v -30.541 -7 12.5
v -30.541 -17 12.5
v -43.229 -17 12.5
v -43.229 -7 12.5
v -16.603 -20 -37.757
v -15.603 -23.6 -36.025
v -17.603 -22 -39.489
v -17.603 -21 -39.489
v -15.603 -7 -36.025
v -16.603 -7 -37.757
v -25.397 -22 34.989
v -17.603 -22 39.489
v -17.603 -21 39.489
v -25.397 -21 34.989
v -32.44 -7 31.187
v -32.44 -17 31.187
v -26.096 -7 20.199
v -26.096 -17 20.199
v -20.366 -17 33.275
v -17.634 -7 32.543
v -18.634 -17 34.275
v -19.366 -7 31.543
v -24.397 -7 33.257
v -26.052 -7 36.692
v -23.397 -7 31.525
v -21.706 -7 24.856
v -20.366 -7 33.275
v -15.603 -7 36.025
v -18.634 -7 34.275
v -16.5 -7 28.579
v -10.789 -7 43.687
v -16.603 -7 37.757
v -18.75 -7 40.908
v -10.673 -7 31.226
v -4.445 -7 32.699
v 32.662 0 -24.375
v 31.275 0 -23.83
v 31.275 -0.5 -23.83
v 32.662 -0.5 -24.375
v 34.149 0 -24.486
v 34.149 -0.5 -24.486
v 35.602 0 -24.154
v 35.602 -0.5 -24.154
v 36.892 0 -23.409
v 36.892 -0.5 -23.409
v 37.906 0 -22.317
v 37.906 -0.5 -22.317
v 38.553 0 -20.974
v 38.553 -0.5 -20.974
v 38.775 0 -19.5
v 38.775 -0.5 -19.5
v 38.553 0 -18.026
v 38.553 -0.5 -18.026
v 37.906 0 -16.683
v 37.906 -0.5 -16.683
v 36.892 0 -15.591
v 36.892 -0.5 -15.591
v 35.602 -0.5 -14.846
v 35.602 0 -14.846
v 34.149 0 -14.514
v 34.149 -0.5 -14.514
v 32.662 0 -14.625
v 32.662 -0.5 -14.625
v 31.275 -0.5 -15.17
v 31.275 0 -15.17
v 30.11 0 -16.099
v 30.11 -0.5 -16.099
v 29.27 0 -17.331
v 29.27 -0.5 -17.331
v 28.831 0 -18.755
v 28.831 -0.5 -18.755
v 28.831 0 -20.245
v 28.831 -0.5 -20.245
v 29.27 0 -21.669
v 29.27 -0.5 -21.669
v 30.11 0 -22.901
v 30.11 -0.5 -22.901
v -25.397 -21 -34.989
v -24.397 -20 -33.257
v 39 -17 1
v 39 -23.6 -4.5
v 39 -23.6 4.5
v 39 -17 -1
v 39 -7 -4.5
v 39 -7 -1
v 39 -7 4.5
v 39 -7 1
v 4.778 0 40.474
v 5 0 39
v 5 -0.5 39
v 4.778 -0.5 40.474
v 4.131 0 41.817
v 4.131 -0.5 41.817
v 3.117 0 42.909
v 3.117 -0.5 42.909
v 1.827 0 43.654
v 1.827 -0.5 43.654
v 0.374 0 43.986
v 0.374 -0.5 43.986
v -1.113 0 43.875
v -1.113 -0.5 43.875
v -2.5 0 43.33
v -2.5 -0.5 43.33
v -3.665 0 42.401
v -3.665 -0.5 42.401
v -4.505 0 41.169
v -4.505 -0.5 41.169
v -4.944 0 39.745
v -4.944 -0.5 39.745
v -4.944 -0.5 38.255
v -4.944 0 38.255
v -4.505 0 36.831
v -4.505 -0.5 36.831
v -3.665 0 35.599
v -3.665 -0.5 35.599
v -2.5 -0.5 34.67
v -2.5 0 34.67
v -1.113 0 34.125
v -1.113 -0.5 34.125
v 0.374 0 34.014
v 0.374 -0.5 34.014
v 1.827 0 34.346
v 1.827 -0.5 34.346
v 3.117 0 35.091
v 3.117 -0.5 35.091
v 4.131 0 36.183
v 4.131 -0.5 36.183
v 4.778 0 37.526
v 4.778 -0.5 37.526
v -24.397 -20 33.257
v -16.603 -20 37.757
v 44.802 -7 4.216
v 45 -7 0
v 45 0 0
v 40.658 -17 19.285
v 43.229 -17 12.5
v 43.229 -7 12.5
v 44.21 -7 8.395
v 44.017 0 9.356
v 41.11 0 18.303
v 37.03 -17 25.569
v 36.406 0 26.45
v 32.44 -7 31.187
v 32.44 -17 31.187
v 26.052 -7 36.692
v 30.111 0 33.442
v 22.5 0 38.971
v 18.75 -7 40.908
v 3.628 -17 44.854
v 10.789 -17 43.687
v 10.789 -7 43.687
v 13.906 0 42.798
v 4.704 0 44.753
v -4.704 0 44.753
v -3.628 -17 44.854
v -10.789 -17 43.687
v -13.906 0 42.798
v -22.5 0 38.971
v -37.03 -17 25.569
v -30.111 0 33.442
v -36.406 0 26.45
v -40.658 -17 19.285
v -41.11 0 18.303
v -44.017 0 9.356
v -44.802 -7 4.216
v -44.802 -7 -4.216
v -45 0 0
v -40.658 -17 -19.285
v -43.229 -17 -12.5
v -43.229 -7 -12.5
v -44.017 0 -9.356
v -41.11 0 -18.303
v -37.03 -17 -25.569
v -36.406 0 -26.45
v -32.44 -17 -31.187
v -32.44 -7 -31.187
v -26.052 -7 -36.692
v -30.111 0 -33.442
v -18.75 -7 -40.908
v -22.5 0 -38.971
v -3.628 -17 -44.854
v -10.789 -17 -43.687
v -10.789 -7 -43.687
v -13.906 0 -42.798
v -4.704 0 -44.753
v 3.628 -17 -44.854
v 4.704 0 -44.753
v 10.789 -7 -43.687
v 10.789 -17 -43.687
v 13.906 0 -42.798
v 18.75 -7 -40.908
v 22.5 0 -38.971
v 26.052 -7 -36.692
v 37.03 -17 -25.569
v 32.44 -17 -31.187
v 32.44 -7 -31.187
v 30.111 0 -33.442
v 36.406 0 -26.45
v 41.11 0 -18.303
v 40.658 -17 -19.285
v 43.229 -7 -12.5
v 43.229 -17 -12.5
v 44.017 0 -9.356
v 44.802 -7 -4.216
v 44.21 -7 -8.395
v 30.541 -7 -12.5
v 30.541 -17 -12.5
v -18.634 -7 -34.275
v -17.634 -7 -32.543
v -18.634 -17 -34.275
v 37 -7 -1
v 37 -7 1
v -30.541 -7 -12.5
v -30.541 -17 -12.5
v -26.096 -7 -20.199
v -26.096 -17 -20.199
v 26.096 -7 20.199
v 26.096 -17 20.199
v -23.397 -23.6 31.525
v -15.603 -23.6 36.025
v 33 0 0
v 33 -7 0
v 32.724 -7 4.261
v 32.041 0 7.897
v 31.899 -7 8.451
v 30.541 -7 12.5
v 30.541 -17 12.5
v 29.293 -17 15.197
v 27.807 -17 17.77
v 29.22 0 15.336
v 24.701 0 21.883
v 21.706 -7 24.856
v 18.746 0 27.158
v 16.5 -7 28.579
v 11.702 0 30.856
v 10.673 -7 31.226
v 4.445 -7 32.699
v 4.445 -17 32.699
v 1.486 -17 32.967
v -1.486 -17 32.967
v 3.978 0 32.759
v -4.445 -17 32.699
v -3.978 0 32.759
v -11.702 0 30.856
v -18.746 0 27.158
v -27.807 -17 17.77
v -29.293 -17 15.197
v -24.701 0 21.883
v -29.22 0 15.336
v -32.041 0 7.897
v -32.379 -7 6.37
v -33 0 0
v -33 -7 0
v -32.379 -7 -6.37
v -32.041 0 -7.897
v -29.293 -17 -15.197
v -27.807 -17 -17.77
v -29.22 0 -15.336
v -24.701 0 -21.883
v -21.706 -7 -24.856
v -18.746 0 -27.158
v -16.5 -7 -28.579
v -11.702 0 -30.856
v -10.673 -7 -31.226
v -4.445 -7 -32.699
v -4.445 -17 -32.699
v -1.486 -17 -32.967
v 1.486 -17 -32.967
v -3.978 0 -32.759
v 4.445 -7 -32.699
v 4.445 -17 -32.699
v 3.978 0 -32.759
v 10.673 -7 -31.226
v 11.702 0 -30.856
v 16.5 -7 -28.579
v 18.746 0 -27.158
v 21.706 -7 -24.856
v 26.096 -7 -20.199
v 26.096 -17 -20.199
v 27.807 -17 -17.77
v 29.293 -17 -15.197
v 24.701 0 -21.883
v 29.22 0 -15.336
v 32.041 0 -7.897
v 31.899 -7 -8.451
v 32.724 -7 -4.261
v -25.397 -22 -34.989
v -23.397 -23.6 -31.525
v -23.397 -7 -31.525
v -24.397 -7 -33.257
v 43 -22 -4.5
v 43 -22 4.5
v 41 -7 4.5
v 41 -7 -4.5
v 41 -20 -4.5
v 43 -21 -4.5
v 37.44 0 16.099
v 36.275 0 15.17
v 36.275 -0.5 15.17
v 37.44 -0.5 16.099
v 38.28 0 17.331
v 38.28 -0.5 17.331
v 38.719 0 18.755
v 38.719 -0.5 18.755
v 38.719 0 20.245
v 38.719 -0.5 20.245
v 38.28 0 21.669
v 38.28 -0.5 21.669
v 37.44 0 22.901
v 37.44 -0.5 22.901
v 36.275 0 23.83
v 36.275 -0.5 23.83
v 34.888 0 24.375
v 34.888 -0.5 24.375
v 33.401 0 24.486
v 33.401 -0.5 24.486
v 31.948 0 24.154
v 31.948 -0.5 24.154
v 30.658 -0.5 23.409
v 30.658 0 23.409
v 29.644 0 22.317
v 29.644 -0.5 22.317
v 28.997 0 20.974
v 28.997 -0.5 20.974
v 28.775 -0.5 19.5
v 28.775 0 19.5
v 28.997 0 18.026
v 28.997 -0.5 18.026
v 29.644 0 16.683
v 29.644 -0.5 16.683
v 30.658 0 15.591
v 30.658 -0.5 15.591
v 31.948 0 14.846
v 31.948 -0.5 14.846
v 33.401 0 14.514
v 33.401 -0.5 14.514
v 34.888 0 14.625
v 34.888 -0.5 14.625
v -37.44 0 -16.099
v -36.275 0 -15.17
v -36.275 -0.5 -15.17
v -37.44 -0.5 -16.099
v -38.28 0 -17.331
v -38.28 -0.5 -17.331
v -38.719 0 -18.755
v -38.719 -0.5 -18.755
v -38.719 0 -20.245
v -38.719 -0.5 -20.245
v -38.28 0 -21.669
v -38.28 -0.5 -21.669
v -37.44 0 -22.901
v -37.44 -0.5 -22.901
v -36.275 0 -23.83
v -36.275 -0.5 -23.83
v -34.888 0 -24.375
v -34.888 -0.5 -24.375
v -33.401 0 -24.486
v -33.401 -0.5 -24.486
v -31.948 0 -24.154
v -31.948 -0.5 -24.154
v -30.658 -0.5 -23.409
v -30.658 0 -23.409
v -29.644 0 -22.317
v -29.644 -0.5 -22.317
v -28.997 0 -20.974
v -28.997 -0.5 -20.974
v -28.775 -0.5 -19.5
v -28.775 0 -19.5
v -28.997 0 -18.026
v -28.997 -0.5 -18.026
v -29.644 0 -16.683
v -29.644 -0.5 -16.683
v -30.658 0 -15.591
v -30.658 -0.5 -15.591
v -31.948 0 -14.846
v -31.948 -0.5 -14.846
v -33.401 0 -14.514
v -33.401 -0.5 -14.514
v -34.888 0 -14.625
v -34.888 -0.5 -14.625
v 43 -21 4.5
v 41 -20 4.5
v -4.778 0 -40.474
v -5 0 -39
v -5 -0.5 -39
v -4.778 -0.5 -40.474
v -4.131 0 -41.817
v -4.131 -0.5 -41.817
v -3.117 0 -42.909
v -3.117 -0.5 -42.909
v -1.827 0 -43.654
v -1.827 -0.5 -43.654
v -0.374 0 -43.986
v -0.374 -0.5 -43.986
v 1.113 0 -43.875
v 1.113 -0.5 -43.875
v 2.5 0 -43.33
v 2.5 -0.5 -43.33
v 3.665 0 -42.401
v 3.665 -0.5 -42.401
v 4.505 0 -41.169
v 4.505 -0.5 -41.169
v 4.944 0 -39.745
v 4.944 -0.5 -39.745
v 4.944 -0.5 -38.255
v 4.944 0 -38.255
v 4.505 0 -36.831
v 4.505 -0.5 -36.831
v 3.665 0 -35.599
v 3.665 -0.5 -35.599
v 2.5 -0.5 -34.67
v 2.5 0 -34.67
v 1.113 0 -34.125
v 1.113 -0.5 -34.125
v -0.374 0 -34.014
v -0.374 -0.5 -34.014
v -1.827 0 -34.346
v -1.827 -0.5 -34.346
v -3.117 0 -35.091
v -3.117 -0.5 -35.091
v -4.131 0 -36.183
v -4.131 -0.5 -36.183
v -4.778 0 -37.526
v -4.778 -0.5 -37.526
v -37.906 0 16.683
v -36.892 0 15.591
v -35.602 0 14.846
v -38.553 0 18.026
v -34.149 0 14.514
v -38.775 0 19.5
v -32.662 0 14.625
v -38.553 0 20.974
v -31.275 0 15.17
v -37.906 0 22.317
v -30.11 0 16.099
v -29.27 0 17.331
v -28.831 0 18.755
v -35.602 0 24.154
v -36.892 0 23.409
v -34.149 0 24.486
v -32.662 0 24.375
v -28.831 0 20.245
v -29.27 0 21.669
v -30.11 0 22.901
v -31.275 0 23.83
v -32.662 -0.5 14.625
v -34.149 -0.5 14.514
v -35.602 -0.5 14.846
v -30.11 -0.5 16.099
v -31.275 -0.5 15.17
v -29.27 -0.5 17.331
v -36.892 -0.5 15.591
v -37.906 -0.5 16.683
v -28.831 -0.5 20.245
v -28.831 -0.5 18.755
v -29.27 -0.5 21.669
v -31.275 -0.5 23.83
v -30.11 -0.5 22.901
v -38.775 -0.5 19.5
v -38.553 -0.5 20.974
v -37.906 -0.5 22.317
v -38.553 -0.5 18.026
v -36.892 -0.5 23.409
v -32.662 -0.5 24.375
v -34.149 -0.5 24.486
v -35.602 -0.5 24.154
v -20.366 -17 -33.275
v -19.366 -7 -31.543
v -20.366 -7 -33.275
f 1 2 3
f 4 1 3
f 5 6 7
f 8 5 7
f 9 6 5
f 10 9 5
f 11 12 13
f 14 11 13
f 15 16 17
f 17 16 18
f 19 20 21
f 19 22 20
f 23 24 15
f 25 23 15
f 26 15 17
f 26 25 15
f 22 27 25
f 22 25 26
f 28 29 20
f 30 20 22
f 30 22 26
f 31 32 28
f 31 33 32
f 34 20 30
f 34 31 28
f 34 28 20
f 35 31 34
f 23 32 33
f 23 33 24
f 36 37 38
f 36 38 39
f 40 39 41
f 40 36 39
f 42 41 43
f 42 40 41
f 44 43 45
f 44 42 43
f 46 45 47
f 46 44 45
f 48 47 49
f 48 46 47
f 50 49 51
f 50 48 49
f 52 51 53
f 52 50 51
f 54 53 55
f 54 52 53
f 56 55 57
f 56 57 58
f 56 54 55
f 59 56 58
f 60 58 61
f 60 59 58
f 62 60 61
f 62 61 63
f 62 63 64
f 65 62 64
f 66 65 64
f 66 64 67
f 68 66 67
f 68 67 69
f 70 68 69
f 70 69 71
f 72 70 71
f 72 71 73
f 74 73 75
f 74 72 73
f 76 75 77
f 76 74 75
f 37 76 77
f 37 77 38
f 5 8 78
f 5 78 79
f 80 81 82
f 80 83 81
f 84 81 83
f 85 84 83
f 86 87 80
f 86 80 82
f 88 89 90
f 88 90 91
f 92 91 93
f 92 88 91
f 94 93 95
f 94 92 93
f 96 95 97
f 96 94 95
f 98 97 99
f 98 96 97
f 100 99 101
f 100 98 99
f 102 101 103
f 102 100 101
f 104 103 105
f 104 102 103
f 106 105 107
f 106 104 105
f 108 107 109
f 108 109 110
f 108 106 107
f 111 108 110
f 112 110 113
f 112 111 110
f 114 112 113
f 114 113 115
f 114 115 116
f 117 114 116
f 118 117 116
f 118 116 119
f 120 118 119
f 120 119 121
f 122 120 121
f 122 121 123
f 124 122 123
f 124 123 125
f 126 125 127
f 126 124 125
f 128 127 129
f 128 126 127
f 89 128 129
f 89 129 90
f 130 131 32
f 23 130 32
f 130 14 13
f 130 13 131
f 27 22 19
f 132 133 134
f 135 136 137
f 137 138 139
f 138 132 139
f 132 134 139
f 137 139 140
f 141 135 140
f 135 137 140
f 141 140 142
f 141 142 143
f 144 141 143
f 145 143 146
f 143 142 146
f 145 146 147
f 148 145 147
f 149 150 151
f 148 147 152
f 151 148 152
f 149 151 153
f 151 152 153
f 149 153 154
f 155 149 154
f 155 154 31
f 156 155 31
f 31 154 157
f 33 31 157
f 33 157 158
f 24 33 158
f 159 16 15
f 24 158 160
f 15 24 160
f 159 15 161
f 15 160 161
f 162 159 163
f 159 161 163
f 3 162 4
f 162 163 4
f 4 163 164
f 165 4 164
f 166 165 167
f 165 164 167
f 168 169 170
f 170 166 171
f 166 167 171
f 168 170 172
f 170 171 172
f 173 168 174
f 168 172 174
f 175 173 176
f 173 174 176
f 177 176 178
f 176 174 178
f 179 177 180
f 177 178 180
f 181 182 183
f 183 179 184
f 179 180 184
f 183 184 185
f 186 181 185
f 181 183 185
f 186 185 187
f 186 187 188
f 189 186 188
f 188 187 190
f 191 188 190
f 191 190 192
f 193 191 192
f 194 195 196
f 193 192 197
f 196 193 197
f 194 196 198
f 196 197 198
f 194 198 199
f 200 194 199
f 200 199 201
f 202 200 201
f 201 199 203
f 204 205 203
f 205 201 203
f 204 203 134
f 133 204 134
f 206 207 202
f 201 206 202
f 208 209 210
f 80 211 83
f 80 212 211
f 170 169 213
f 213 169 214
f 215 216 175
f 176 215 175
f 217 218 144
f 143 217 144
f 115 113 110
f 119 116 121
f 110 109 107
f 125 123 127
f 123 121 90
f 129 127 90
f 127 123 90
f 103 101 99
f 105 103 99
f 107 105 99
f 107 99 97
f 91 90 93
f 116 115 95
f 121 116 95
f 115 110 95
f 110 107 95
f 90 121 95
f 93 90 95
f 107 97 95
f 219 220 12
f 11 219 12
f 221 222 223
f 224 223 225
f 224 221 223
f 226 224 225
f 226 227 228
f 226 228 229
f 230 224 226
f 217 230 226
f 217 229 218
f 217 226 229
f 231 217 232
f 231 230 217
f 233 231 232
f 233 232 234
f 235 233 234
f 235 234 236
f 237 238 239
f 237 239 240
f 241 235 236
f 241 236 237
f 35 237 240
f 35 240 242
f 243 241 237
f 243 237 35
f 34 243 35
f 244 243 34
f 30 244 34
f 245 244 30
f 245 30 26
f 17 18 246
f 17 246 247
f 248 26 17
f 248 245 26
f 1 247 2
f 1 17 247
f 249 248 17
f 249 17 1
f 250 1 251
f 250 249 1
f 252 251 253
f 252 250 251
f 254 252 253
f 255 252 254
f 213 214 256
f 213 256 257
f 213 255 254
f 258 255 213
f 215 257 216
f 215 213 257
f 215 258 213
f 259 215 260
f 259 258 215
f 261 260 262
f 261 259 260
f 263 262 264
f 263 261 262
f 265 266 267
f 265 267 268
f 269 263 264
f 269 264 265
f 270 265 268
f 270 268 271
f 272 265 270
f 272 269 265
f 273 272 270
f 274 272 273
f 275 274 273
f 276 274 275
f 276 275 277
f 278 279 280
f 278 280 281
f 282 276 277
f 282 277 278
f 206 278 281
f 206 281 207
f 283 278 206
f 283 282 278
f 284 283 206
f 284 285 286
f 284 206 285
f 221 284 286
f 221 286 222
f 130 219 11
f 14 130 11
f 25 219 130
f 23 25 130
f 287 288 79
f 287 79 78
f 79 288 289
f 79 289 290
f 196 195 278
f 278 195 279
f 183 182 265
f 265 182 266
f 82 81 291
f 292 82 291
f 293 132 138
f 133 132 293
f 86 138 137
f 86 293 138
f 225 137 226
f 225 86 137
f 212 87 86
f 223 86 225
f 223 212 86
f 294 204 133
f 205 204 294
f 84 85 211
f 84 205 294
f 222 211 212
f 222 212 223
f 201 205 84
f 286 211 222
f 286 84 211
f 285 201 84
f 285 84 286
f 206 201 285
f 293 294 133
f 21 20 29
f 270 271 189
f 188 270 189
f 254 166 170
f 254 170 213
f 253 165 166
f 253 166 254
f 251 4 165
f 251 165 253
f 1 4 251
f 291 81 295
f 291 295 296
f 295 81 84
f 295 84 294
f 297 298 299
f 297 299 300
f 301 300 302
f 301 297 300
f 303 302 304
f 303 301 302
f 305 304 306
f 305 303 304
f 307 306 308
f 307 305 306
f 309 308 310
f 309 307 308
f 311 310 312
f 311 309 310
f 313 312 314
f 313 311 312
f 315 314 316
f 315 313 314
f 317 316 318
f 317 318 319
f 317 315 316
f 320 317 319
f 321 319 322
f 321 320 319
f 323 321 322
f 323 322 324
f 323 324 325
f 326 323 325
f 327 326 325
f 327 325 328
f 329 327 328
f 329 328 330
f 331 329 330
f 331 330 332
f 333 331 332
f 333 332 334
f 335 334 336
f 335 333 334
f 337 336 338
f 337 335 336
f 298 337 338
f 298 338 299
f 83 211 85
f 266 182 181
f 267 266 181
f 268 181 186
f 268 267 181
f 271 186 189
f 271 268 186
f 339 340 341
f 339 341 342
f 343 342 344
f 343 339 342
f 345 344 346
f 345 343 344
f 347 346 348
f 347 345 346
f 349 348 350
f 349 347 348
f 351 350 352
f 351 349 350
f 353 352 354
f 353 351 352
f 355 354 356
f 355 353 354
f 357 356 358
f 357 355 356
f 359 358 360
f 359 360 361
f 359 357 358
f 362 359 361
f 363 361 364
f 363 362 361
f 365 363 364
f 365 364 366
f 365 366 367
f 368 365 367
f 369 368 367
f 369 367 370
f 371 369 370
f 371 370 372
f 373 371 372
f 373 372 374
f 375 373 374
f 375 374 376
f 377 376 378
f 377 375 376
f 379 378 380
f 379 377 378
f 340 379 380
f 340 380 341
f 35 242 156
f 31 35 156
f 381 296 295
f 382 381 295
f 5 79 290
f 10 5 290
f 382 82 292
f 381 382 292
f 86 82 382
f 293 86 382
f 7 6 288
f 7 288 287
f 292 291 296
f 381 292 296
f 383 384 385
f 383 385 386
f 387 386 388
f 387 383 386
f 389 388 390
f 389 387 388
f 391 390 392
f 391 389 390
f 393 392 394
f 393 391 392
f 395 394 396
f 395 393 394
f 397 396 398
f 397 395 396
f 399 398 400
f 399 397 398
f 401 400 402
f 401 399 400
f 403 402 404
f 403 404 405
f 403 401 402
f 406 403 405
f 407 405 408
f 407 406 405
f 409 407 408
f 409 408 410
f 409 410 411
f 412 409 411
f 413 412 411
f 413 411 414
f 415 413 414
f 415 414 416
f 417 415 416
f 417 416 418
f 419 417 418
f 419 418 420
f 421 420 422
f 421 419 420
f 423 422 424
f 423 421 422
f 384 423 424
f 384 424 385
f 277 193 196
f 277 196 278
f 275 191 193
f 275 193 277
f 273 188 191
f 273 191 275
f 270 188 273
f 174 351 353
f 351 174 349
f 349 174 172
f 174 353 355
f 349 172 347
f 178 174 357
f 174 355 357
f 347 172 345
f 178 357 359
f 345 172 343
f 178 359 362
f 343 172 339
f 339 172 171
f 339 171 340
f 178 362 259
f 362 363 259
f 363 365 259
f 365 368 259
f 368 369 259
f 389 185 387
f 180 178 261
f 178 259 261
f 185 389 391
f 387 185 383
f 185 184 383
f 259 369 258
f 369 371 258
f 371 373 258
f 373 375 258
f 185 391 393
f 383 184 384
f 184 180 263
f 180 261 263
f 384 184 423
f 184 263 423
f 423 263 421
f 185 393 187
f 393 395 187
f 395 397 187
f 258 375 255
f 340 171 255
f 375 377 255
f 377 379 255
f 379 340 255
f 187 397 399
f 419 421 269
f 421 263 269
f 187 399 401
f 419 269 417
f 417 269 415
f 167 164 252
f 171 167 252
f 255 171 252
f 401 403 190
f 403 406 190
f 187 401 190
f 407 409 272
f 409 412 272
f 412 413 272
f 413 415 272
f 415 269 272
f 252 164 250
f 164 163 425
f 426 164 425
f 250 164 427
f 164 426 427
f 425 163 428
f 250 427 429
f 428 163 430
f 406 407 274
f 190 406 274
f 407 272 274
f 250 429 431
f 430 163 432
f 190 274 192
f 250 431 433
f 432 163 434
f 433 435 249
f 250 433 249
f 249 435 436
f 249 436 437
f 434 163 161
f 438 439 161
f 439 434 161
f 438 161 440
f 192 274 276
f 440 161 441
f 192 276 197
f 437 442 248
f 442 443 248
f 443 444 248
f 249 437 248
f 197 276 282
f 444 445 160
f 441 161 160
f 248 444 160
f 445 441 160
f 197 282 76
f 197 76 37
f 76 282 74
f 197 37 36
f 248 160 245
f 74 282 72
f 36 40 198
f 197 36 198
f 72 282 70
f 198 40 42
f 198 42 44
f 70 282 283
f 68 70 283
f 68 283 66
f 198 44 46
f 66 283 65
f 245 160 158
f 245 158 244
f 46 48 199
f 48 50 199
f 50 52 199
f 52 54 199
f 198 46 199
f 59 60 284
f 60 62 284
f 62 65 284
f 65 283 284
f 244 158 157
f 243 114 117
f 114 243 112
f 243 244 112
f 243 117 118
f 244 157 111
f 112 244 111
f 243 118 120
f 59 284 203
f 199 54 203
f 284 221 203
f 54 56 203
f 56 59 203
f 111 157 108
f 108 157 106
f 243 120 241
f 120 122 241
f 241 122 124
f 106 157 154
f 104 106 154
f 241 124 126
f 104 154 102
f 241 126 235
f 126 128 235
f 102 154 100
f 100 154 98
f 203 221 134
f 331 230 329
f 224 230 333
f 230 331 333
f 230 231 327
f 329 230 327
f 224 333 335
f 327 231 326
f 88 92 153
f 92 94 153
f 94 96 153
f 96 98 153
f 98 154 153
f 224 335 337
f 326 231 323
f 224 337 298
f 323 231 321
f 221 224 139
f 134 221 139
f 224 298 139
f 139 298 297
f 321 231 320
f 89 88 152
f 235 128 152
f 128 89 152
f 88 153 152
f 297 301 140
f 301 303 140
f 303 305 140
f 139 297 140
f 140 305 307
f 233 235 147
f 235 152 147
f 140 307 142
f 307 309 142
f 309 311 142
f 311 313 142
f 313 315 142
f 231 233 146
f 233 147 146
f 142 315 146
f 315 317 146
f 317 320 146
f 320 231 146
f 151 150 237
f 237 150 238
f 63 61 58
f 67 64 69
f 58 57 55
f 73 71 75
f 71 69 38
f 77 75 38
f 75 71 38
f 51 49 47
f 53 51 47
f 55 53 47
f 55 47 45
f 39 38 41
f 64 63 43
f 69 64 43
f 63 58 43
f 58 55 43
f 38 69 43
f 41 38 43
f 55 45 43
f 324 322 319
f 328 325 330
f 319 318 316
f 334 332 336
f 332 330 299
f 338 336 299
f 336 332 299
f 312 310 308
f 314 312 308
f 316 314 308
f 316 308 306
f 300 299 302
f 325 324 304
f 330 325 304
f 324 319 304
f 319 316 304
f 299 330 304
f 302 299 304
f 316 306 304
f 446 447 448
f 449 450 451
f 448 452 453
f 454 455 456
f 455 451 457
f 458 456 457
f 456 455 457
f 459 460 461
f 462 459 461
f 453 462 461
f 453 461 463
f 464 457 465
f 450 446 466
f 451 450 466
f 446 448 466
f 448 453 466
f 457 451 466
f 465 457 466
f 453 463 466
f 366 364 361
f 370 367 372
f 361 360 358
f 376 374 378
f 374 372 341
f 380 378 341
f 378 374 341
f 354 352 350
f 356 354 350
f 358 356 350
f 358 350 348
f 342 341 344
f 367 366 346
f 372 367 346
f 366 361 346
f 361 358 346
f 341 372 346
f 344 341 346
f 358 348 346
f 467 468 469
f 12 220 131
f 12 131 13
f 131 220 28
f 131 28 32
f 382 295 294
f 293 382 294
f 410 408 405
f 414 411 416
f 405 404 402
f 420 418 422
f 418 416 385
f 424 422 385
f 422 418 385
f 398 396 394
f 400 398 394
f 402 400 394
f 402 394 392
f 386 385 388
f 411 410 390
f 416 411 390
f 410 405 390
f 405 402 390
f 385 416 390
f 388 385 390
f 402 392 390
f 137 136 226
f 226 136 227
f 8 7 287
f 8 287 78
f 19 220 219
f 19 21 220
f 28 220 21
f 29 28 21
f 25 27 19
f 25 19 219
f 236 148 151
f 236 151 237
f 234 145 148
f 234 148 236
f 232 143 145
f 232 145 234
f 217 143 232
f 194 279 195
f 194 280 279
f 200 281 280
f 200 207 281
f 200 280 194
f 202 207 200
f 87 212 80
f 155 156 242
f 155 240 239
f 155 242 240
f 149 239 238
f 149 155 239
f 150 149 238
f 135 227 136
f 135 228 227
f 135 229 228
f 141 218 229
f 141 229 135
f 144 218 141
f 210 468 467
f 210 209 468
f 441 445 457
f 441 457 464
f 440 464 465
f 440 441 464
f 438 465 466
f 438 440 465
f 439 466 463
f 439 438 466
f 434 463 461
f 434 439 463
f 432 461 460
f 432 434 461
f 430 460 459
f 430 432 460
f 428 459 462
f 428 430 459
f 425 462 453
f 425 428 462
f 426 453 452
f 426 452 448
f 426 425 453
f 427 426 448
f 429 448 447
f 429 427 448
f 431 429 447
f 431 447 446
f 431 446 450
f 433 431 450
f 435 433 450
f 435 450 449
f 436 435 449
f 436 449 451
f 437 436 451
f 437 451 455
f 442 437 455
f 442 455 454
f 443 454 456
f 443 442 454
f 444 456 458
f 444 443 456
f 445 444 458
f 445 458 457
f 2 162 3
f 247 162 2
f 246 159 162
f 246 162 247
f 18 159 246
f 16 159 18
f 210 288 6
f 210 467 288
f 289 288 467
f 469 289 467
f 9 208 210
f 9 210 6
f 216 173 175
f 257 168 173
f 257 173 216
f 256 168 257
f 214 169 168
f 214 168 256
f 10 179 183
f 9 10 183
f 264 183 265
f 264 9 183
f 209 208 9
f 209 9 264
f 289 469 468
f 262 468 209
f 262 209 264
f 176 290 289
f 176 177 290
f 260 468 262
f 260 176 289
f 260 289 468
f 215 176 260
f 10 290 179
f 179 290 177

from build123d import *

# Parameters (mm, degrees)
F0_R             = 45
F0_R_2           = 33
F1_DEPTH         = 17
F2_R             = 5
F3_DEPTH         = 0.5
F3_COPIES_COUNT  = 6
F6_DEPTH         = 10
F8_COUNT         = 6
F9_W             = 6
F9_H             = 9
F10_DEPTH        = 17
F10_COPIES_COUNT = 3
F12_DEPTH        = 10
F12_COPIES_COUNT = 3
F14_DEPTH        = 1
F14_COPIES_COUNT = 3


# Not quite as in the source:
# - a pattern or mirror of a feature is missing from the dataset's text; its kind, count and spacing are read off the source's solid
# - a feature names something its author has since deleted; it is built from what else it names


with BuildPart() as f1:
    # F0 (on Front) → F1 (new body)
    with BuildSketch(Plane.XZ):
        Circle(F0_R)
        Circle(F0_R_2, mode=Mode.SUBTRACT)
    extrude(amount=F1_DEPTH)

    # F2 (on Front) → F3 (cut)
    with BuildSketch(Plane.XZ):
        with Locations((0, 39)):
            Circle(F2_R)
    f3 = extrude(amount=F3_DEPTH, mode=Mode.SUBTRACT)

    # F3_copies: F3 ×6 about axis
    f3_copies_axis = Axis((0, 0, 0), (0, 1, 0))
    for i in range(1, F3_COPIES_COUNT):
        add(f3.rotate(f3_copies_axis, i * 360 / F3_COPIES_COUNT), mode=Mode.SUBTRACT)

    # F5 (on face) → F6 (cut)
    with BuildSketch(Plane.XZ.offset(17)):
        with BuildLine():
            Line((-30.5409561082, 12.5), (-43.2290411645, 12.5))
            ThreePointArc((-43.2290411645, 12.5), (-45, 0), (-43.2290411645, -12.5))
            Line((-43.2290411645, -12.5), (-30.5409561082, -12.5))
            ThreePointArc((-30.5409561082, -12.5), (-33, 0), (-30.5409561082, 12.5))
        make_face()
    f6 = extrude(amount=-F6_DEPTH, mode=Mode.SUBTRACT)

    # F8: F6 ×6 about axis
    f8_axis = Axis((0, -20.116, 0), (0, -1, 0))
    for i in range(1, F8_COUNT):
        add(f6.rotate(f8_axis, i * 360 / F8_COUNT), mode=Mode.SUBTRACT)

    # F9 (on face) → F10 (join)
    with BuildSketch(Plane.XZ.offset(7)):
        with Locations((42, 0)):
            Rectangle(F9_W, F9_H)
    f10 = extrude(amount=F10_DEPTH)

    # F10_copies: F10 ×3 about axis
    f10_copies_axis = Axis((0, 0, 0), (0, 1, 0))
    for i in range(1, F10_COPIES_COUNT):
        add(f10.rotate(f10_copies_axis, i * 360 / F10_COPIES_COUNT))

    # F11 (on face) → F12 (cut)
    with BuildSketch(Plane(origin=(0, 0, -4.5), x_dir=(1, 0, 0), z_dir=(0, 0, -1))):
        Polygon((39, 24), (39, 23.6), (43, 22), (43, 21), (41, 20), (41, 7), (44.7744346698, 7), (45, 7), (45, 24), align=None)
    f12 = extrude(amount=-F12_DEPTH, mode=Mode.SUBTRACT)

    # F12_copies: F12 ×3 about axis
    f12_copies_axis = Axis((0, 0, 0), (0, 1, 0))
    for i in range(1, F12_COPIES_COUNT):
        add(f12.rotate(f12_copies_axis, i * 360 / F12_COPIES_COUNT), mode=Mode.SUBTRACT)

    # F13 (on Top) → F14 (join, symmetric)
    with BuildSketch(Plane.XY):
        Polygon((37, -7), (39, -17), (39, -7), align=None)
    f14 = extrude(amount=F14_DEPTH, both=True)

    # F14_copies: F14 ×3 about axis
    f14_copies_axis = Axis((0, 0, 0), (0, 1, 0))
    for i in range(1, F14_COPIES_COUNT):
        add(f14.rotate(f14_copies_axis, i * 360 / F14_COPIES_COUNT))


solid = f1.part
